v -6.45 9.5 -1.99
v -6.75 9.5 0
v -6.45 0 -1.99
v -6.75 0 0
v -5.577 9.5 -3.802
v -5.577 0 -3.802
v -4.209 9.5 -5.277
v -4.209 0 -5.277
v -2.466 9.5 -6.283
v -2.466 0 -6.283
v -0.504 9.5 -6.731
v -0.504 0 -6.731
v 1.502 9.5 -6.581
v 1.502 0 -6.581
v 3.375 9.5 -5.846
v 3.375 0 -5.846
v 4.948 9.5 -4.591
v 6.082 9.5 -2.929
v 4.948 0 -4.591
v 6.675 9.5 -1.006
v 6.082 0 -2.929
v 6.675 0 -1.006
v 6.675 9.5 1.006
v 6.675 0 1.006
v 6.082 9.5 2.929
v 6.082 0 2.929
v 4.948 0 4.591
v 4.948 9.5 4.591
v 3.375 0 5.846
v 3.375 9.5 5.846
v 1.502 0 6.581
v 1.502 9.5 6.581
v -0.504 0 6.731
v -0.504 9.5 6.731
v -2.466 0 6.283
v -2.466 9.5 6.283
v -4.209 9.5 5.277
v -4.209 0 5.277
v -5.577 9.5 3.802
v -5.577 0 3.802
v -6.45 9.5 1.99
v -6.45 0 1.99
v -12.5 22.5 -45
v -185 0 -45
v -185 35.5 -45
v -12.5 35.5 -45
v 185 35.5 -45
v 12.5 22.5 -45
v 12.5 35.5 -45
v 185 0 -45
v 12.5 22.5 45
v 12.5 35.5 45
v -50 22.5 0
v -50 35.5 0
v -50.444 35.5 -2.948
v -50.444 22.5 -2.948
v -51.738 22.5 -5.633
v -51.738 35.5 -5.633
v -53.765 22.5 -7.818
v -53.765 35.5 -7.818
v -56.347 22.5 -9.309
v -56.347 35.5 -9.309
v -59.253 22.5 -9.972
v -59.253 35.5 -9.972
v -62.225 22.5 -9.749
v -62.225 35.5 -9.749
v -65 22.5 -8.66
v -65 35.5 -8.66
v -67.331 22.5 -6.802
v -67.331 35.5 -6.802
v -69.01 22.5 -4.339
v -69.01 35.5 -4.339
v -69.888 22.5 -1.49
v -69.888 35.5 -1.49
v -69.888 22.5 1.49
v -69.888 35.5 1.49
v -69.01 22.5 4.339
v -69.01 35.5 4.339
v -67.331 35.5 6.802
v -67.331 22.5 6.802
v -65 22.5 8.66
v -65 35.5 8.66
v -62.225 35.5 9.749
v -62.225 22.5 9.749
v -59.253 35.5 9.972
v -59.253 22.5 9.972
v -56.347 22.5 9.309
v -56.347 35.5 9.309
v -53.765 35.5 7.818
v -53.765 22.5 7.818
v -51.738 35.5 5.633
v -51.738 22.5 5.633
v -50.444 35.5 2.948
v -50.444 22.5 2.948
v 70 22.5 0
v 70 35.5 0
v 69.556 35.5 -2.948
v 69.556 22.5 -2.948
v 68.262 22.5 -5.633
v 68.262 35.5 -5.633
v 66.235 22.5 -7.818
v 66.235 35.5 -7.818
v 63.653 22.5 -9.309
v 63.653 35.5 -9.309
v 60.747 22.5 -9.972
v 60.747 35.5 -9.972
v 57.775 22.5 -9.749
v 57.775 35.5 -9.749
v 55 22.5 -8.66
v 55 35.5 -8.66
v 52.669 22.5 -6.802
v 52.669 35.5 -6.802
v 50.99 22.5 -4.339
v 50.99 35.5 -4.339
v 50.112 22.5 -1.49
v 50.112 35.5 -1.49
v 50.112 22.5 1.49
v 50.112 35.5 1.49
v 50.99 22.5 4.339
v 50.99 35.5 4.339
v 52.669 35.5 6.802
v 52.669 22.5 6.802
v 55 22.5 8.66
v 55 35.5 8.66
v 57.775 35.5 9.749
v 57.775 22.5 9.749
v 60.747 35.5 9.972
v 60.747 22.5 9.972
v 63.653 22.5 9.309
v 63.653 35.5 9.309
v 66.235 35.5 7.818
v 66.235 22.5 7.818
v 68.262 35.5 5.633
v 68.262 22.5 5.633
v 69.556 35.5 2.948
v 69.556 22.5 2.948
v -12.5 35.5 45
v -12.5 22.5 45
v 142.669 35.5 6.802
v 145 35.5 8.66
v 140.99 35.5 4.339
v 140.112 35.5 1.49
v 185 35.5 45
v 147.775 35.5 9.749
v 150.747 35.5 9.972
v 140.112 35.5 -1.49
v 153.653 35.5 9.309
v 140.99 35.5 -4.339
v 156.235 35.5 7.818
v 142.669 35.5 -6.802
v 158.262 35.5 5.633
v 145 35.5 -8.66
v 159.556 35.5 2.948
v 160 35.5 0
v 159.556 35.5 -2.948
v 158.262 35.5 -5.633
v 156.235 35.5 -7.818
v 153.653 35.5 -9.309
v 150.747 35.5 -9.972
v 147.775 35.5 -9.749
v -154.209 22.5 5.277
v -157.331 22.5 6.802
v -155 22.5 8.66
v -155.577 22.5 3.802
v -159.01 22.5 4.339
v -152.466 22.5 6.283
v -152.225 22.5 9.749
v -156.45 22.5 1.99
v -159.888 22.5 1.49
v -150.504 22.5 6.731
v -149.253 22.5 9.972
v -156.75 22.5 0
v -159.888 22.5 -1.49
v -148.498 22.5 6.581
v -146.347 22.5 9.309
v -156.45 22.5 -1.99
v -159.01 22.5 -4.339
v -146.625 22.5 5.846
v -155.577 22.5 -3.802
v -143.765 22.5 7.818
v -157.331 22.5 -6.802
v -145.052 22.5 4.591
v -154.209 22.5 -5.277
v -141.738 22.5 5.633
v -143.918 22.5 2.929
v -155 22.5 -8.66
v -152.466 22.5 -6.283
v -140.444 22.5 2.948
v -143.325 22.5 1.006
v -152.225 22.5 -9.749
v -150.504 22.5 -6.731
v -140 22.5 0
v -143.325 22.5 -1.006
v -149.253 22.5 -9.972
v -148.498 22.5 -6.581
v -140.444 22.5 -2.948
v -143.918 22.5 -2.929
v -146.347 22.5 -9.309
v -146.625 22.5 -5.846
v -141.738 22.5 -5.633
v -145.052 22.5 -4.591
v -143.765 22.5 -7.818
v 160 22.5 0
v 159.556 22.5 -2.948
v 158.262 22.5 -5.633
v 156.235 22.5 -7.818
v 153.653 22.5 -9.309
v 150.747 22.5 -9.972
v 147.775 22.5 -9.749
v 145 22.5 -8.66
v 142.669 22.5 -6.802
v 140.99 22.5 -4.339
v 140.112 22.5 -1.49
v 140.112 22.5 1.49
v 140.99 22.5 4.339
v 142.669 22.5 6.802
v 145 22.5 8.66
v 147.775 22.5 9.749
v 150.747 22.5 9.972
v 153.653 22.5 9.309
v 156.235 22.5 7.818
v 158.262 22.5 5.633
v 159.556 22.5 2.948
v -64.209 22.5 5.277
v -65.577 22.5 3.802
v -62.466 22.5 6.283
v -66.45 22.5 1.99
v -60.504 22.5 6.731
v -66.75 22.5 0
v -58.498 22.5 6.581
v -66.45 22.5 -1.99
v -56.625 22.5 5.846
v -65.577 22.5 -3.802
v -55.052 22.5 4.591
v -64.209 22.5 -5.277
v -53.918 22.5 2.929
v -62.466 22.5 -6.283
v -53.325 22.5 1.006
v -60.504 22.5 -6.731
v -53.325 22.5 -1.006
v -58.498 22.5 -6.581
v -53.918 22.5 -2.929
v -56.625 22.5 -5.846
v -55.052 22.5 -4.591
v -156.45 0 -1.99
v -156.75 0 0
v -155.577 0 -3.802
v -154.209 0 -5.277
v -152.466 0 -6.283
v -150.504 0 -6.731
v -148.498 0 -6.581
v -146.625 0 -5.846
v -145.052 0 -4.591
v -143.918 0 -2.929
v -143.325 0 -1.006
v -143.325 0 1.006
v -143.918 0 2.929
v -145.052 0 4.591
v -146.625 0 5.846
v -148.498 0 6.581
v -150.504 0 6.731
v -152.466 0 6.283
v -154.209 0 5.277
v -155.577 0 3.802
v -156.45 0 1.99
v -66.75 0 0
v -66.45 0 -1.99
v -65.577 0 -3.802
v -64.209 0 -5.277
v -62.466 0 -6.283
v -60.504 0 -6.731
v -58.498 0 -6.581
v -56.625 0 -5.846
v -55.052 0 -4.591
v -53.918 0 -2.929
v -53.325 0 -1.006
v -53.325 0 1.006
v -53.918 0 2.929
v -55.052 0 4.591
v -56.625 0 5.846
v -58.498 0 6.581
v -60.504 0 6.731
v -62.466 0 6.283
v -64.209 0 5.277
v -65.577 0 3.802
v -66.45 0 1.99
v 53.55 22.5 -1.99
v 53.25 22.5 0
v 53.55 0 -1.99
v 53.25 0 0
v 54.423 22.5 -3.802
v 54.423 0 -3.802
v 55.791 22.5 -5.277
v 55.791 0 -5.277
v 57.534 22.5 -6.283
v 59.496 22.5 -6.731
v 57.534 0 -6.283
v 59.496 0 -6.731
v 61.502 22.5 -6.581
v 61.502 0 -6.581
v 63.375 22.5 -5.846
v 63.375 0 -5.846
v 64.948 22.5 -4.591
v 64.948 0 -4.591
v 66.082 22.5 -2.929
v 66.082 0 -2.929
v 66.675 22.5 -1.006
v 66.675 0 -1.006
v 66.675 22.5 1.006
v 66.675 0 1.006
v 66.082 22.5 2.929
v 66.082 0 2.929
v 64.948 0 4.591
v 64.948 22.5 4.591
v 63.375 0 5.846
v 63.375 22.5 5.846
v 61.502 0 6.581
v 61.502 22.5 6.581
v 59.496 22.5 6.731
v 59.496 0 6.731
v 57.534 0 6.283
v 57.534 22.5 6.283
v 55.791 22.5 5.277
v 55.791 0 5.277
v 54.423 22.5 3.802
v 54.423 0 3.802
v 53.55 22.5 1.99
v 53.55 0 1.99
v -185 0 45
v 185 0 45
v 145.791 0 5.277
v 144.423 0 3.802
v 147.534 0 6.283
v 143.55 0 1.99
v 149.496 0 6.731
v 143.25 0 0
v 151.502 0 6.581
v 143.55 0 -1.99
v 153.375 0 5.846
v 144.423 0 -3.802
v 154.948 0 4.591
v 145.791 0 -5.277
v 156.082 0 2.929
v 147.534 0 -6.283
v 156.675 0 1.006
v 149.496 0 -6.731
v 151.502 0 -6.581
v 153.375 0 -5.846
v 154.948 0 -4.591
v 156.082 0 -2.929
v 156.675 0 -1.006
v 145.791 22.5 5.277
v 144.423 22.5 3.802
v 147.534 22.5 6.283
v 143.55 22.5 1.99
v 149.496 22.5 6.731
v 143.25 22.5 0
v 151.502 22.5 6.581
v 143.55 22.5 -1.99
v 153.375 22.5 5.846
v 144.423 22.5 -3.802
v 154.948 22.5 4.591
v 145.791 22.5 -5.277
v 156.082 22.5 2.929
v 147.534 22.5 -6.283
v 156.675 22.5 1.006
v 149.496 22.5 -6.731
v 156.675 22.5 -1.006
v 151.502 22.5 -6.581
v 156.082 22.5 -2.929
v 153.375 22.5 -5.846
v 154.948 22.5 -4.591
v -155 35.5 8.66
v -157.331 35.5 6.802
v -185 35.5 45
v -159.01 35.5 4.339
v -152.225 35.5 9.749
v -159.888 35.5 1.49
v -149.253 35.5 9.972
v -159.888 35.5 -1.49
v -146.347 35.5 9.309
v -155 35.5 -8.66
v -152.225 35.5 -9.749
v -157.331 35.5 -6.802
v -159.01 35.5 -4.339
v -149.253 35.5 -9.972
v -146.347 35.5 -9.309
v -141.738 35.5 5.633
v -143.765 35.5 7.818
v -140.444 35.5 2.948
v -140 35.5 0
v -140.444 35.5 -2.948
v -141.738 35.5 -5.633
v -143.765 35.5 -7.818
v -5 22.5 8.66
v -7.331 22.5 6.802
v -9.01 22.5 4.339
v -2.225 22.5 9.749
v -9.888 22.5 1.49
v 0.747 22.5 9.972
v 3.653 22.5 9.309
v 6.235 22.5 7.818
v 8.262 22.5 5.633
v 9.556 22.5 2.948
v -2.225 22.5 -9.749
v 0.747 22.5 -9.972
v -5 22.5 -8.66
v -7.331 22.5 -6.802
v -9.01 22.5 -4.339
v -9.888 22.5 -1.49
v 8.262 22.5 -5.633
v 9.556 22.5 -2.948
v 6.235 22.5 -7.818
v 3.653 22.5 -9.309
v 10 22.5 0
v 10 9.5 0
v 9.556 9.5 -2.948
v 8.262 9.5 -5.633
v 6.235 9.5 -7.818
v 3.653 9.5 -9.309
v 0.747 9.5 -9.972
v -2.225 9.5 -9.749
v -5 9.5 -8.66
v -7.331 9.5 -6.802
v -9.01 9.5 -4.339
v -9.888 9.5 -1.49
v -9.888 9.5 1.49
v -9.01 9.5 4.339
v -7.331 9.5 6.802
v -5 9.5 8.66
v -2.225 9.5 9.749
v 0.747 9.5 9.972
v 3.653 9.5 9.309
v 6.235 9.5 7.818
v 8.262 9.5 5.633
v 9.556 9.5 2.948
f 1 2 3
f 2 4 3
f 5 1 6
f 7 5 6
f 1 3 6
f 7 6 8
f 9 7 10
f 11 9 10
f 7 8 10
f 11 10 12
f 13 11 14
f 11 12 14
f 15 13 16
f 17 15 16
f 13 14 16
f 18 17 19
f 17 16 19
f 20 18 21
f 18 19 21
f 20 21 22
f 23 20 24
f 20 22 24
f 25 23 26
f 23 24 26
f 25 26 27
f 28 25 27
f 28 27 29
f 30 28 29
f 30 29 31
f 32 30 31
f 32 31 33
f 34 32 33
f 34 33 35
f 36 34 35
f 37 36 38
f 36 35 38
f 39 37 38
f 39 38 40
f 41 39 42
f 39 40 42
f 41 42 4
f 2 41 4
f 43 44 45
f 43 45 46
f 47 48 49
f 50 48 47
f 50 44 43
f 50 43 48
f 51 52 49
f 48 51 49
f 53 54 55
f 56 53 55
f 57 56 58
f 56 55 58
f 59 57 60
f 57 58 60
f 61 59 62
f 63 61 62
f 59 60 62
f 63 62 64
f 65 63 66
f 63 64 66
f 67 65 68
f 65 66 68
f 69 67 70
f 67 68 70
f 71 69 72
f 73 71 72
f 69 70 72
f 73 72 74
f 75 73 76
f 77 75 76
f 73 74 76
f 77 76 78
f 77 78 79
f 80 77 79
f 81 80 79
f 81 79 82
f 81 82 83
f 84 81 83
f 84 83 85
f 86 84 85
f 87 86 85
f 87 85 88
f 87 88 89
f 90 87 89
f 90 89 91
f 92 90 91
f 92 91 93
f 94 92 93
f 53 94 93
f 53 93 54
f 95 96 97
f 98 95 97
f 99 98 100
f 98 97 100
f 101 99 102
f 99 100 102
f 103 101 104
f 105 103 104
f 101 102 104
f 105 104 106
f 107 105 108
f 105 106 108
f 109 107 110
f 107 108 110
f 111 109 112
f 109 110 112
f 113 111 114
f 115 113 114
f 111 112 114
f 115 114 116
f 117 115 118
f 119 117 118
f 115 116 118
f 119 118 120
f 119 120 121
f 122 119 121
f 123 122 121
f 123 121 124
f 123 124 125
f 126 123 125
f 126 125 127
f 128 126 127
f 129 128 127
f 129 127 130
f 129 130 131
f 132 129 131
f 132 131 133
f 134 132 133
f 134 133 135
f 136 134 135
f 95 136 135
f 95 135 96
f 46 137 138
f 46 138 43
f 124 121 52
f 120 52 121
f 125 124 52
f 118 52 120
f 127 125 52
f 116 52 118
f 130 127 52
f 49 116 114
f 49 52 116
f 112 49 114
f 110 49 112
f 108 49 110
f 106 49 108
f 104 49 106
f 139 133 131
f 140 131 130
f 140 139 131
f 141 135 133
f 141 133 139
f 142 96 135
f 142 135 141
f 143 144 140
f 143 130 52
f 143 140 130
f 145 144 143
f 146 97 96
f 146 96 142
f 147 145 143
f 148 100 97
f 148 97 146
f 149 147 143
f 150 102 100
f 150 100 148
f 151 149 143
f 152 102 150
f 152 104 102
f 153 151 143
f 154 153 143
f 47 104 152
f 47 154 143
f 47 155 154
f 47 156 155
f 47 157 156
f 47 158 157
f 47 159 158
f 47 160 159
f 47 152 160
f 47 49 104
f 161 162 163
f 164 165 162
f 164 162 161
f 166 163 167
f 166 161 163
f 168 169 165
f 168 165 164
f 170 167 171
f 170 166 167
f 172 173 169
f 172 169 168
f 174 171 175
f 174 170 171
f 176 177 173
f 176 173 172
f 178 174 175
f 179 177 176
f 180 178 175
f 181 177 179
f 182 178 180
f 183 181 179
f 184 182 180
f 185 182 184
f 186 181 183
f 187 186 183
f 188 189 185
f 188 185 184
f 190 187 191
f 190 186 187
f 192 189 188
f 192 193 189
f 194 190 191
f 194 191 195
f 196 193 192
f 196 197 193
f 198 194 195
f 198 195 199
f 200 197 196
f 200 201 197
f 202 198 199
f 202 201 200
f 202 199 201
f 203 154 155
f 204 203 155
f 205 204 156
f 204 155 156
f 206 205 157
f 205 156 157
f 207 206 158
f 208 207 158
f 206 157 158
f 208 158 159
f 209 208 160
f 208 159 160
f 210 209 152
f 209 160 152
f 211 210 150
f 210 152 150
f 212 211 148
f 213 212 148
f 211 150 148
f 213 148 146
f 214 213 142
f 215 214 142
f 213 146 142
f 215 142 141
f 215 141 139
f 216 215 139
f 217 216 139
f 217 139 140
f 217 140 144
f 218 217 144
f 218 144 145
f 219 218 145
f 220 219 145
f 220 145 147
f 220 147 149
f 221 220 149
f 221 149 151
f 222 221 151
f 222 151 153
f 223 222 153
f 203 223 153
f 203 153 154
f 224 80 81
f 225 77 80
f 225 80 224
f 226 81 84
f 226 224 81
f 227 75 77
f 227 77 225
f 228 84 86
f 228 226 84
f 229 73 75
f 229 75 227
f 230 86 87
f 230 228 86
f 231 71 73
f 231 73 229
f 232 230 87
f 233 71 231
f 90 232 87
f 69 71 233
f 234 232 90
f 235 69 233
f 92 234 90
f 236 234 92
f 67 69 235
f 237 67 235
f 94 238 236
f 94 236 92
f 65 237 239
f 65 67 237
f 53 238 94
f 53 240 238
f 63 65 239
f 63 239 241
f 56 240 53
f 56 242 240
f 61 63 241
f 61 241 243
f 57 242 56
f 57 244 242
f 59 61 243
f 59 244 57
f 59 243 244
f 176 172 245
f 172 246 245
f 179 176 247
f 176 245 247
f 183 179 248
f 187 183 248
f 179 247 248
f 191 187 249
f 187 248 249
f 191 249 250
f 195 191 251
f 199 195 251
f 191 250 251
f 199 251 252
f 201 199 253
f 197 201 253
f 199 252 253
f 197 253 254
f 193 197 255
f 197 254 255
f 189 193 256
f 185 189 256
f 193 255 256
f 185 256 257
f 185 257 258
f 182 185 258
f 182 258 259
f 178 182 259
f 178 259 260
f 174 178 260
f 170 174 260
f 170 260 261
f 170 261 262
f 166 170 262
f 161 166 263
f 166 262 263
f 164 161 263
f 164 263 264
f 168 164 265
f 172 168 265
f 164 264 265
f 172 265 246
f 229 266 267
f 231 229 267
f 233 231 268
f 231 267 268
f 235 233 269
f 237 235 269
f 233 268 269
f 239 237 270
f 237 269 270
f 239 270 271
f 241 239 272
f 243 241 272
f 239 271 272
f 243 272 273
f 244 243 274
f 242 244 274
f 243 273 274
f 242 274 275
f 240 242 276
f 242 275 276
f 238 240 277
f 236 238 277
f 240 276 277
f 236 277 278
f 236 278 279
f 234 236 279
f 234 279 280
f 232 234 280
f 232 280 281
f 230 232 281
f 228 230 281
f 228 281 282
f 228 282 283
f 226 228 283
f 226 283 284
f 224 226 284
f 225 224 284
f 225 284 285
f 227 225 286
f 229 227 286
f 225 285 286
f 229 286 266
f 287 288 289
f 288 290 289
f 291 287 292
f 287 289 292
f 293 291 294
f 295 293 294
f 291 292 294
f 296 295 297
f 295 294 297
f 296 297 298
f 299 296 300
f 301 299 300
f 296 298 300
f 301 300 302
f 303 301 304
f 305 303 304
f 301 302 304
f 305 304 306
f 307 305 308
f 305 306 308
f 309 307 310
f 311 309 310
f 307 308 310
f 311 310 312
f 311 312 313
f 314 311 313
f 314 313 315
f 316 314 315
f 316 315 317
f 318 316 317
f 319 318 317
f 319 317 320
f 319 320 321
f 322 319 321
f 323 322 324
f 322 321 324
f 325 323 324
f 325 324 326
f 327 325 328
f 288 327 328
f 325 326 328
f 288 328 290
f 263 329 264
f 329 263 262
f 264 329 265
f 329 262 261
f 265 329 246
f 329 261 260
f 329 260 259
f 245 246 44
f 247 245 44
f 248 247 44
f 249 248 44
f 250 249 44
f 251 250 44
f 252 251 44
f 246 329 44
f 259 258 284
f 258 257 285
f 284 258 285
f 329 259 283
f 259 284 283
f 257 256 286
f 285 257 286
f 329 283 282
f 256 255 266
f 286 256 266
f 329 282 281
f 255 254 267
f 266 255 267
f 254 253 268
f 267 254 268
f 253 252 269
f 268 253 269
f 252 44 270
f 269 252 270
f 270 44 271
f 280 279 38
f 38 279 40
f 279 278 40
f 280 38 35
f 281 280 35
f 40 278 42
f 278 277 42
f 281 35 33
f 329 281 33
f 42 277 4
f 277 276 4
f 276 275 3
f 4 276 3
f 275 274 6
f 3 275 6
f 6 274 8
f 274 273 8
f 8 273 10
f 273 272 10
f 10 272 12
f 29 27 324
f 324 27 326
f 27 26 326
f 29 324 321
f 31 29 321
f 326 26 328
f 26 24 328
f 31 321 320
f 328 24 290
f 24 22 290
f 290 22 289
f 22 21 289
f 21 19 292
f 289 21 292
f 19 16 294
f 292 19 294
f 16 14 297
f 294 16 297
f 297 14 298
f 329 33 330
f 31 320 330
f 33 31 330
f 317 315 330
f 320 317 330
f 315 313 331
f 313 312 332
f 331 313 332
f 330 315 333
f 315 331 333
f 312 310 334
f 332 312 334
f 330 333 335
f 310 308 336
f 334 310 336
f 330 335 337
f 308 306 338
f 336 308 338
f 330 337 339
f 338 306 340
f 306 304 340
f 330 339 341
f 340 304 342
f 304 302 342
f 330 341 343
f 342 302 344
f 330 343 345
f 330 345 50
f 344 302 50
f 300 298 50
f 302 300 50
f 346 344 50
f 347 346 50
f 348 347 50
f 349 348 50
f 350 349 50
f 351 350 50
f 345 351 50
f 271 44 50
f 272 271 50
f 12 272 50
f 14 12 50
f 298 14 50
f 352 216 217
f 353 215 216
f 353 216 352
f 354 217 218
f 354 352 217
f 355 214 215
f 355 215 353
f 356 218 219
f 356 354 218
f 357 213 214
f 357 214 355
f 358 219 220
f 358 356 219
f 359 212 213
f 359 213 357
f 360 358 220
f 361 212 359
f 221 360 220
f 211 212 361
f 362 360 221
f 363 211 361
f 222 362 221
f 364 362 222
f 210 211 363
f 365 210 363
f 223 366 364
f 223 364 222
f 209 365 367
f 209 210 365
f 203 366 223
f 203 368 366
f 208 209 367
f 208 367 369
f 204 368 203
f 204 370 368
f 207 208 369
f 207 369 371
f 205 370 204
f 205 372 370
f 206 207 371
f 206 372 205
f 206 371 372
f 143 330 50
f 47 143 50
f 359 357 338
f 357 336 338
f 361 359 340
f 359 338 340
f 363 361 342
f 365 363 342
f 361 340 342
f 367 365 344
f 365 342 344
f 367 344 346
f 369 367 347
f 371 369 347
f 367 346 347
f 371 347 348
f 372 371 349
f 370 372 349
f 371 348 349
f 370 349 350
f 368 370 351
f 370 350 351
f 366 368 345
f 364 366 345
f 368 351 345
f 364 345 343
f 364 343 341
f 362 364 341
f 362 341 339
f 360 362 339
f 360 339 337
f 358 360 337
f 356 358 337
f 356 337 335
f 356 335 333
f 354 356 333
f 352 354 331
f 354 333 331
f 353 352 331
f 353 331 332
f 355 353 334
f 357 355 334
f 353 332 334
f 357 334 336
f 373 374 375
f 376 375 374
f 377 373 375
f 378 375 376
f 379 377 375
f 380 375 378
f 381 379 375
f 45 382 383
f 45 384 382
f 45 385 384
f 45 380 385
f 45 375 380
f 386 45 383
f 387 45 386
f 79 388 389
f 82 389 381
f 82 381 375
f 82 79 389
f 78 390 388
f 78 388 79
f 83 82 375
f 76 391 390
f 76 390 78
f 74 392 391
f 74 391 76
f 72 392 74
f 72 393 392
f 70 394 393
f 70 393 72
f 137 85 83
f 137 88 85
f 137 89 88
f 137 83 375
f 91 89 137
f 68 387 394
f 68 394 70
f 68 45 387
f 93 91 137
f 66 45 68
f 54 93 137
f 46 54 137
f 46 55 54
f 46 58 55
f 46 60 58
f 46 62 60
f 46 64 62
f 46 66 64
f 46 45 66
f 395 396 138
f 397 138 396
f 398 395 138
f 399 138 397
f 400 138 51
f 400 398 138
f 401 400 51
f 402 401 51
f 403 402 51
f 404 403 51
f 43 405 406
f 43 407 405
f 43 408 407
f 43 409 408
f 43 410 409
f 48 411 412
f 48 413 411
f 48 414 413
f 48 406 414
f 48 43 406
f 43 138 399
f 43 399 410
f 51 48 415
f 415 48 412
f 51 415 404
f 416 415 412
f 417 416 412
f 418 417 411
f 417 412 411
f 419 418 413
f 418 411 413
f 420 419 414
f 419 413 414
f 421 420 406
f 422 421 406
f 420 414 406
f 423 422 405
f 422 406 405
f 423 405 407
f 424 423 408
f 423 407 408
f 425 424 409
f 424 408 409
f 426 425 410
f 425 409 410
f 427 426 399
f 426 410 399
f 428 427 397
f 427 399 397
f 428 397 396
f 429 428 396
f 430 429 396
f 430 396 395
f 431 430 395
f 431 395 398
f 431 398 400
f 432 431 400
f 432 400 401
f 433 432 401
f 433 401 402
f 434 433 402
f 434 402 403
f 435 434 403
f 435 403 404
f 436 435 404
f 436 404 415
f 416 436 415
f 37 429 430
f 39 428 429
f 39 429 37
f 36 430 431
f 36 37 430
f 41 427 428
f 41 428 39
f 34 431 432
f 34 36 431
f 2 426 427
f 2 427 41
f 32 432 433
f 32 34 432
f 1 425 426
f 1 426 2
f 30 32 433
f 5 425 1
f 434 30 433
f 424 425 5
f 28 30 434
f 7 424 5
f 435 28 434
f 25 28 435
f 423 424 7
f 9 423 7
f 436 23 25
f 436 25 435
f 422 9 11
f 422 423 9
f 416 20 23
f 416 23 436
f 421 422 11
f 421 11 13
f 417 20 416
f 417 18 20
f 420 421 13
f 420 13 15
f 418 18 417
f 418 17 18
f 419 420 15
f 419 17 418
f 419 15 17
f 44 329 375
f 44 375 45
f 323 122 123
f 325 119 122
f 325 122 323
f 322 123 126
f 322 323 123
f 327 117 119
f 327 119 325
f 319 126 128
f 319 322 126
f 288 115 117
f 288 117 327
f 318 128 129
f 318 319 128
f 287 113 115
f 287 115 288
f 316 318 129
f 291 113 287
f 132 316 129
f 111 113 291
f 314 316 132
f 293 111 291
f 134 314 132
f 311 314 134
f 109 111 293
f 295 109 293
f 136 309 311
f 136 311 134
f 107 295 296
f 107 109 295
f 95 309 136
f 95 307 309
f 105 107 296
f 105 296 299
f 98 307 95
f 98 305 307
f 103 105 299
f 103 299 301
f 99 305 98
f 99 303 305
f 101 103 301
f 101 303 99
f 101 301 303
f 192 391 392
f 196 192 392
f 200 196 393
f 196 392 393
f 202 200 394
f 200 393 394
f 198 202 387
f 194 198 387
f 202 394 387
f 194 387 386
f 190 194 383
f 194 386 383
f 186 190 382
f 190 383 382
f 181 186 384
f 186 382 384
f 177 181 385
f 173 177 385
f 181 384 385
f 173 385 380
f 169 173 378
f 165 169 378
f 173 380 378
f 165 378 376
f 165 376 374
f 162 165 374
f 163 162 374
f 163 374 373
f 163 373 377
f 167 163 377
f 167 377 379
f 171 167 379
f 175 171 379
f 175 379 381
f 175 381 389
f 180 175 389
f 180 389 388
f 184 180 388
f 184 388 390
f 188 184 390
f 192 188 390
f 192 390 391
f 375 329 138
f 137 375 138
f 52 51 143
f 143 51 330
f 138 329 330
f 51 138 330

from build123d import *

# Parameters (mm, degrees)
SKETCH_1_W                          = 370
SKETCH_1_H                          = 90
EXTRUDE_1_DEPTH                     = 35.5
SKETCH_2_W                          = 25
SKETCH_2_H                          = 90
CUT_EXTRUDE_1_DEPTH                 = 13
HOLE_WIZARD_M4_1_D                  = 13.5
HOLE_WIZARD_M4_1_CBORE_D            = 20
HOLE_WIZARD_M4_1_CBORE_DEPTH        = 13
PATTERN_LINEAR_1_COUNT              = 2
PATTERN_LINEAR_1_PITCH              = 90
PATTERN_LINEAR_2_COPY_1_D           = 13.5
PATTERN_LINEAR_2_COPY_1_CBORE_D     = 20
PATTERN_LINEAR_2_COPY_1_CBORE_DEPTH = 13
PATTERN_LINEAR_3_COPY_1_D           = 13.5
PATTERN_LINEAR_3_COPY_1_CBORE_D     = 20
PATTERN_LINEAR_3_COPY_1_CBORE_DEPTH = 13
PATTERN_LINEAR_3_COPY_2_D           = 13.5
PATTERN_LINEAR_3_COPY_2_CBORE_D     = 20
PATTERN_LINEAR_3_COPY_2_CBORE_DEPTH = 13
HOLE_WIZARD_M4_2_D                  = 13.5
HOLE_WIZARD_M4_2_CBORE_D            = 20
HOLE_WIZARD_M4_2_CBORE_DEPTH        = 13


with BuildPart() as part:
    # 草图1 → 凸台-拉伸1 (new body)
    with BuildSketch(Plane(origin=(0, 0, 0), x_dir=(1, 0, 0), z_dir=(0, 1, 0))):
        Rectangle(SKETCH_1_W, SKETCH_1_H)
    extrude(amount=EXTRUDE_1_DEPTH)

    # 草图2 → 切除-拉伸1 (cut)
    with BuildSketch(Plane(origin=(0, 35.5, 0), x_dir=(1, 0, 0), z_dir=(0, 1, 0))):
        Rectangle(SKETCH_2_W, SKETCH_2_H)
    extrude(amount=-CUT_EXTRUDE_1_DEPTH, mode=Mode.SUBTRACT)

    # M4 六角头螺栓的柱形沉头孔1 (through all)
    with Locations(Plane(origin=(0, 35.5, 0), x_dir=(1, 0, 0), z_dir=(0, 1, 0))):
        with Locations((-150, 0)):
            hole_wizard_m4_1 = CounterBoreHole(HOLE_WIZARD_M4_1_D / 2, HOLE_WIZARD_M4_1_CBORE_D / 2, HOLE_WIZARD_M4_1_CBORE_DEPTH)

    # 阵列(线性)1: M4 六角头螺栓的柱形沉头孔1 ×2
    with Locations(*[(i * PATTERN_LINEAR_1_PITCH, 0, 0) for i in range(1, PATTERN_LINEAR_1_COUNT)]):
        add(hole_wizard_m4_1, mode=Mode.SUBTRACT)

    # 阵列(线性)2 copy 1 (through all)
    with Locations(Plane(origin=(210, 35.5, 0), x_dir=(1, 0, 0), z_dir=(0, 1, 0))):
        with Locations((-150, 0)):
            CounterBoreHole(PATTERN_LINEAR_2_COPY_1_D / 2, PATTERN_LINEAR_2_COPY_1_CBORE_D / 2, PATTERN_LINEAR_2_COPY_1_CBORE_DEPTH)

    # 阵列(线性)3 copy 1 (through all)
    with Locations(Plane(origin=(300, 35.5, 0), x_dir=(1, 0, 0), z_dir=(0, 1, 0))):
        with Locations((-150, 0)):
            CounterBoreHole(PATTERN_LINEAR_3_COPY_1_D / 2, PATTERN_LINEAR_3_COPY_1_CBORE_D / 2, PATTERN_LINEAR_3_COPY_1_CBORE_DEPTH)

    # 阵列(线性)3 copy 2 (through all)
    with Locations(Plane(origin=(90, 35.5, 0), x_dir=(1, 0, 0), z_dir=(0, 1, 0))):
        with Locations((-150, 0)):
            CounterBoreHole(PATTERN_LINEAR_3_COPY_2_D / 2, PATTERN_LINEAR_3_COPY_2_CBORE_D / 2, PATTERN_LINEAR_3_COPY_2_CBORE_DEPTH)

    # M4 六角头螺栓的柱形沉头孔2 (through all)
    with Locations(Plane(origin=(0, 22.5, 0), x_dir=(1, 0, 0), z_dir=(0, 1, 0))):
        with Locations((0, 0)):
            CounterBoreHole(HOLE_WIZARD_M4_2_D / 2, HOLE_WIZARD_M4_2_CBORE_D / 2, HOLE_WIZARD_M4_2_CBORE_DEPTH)


solid = part.part
